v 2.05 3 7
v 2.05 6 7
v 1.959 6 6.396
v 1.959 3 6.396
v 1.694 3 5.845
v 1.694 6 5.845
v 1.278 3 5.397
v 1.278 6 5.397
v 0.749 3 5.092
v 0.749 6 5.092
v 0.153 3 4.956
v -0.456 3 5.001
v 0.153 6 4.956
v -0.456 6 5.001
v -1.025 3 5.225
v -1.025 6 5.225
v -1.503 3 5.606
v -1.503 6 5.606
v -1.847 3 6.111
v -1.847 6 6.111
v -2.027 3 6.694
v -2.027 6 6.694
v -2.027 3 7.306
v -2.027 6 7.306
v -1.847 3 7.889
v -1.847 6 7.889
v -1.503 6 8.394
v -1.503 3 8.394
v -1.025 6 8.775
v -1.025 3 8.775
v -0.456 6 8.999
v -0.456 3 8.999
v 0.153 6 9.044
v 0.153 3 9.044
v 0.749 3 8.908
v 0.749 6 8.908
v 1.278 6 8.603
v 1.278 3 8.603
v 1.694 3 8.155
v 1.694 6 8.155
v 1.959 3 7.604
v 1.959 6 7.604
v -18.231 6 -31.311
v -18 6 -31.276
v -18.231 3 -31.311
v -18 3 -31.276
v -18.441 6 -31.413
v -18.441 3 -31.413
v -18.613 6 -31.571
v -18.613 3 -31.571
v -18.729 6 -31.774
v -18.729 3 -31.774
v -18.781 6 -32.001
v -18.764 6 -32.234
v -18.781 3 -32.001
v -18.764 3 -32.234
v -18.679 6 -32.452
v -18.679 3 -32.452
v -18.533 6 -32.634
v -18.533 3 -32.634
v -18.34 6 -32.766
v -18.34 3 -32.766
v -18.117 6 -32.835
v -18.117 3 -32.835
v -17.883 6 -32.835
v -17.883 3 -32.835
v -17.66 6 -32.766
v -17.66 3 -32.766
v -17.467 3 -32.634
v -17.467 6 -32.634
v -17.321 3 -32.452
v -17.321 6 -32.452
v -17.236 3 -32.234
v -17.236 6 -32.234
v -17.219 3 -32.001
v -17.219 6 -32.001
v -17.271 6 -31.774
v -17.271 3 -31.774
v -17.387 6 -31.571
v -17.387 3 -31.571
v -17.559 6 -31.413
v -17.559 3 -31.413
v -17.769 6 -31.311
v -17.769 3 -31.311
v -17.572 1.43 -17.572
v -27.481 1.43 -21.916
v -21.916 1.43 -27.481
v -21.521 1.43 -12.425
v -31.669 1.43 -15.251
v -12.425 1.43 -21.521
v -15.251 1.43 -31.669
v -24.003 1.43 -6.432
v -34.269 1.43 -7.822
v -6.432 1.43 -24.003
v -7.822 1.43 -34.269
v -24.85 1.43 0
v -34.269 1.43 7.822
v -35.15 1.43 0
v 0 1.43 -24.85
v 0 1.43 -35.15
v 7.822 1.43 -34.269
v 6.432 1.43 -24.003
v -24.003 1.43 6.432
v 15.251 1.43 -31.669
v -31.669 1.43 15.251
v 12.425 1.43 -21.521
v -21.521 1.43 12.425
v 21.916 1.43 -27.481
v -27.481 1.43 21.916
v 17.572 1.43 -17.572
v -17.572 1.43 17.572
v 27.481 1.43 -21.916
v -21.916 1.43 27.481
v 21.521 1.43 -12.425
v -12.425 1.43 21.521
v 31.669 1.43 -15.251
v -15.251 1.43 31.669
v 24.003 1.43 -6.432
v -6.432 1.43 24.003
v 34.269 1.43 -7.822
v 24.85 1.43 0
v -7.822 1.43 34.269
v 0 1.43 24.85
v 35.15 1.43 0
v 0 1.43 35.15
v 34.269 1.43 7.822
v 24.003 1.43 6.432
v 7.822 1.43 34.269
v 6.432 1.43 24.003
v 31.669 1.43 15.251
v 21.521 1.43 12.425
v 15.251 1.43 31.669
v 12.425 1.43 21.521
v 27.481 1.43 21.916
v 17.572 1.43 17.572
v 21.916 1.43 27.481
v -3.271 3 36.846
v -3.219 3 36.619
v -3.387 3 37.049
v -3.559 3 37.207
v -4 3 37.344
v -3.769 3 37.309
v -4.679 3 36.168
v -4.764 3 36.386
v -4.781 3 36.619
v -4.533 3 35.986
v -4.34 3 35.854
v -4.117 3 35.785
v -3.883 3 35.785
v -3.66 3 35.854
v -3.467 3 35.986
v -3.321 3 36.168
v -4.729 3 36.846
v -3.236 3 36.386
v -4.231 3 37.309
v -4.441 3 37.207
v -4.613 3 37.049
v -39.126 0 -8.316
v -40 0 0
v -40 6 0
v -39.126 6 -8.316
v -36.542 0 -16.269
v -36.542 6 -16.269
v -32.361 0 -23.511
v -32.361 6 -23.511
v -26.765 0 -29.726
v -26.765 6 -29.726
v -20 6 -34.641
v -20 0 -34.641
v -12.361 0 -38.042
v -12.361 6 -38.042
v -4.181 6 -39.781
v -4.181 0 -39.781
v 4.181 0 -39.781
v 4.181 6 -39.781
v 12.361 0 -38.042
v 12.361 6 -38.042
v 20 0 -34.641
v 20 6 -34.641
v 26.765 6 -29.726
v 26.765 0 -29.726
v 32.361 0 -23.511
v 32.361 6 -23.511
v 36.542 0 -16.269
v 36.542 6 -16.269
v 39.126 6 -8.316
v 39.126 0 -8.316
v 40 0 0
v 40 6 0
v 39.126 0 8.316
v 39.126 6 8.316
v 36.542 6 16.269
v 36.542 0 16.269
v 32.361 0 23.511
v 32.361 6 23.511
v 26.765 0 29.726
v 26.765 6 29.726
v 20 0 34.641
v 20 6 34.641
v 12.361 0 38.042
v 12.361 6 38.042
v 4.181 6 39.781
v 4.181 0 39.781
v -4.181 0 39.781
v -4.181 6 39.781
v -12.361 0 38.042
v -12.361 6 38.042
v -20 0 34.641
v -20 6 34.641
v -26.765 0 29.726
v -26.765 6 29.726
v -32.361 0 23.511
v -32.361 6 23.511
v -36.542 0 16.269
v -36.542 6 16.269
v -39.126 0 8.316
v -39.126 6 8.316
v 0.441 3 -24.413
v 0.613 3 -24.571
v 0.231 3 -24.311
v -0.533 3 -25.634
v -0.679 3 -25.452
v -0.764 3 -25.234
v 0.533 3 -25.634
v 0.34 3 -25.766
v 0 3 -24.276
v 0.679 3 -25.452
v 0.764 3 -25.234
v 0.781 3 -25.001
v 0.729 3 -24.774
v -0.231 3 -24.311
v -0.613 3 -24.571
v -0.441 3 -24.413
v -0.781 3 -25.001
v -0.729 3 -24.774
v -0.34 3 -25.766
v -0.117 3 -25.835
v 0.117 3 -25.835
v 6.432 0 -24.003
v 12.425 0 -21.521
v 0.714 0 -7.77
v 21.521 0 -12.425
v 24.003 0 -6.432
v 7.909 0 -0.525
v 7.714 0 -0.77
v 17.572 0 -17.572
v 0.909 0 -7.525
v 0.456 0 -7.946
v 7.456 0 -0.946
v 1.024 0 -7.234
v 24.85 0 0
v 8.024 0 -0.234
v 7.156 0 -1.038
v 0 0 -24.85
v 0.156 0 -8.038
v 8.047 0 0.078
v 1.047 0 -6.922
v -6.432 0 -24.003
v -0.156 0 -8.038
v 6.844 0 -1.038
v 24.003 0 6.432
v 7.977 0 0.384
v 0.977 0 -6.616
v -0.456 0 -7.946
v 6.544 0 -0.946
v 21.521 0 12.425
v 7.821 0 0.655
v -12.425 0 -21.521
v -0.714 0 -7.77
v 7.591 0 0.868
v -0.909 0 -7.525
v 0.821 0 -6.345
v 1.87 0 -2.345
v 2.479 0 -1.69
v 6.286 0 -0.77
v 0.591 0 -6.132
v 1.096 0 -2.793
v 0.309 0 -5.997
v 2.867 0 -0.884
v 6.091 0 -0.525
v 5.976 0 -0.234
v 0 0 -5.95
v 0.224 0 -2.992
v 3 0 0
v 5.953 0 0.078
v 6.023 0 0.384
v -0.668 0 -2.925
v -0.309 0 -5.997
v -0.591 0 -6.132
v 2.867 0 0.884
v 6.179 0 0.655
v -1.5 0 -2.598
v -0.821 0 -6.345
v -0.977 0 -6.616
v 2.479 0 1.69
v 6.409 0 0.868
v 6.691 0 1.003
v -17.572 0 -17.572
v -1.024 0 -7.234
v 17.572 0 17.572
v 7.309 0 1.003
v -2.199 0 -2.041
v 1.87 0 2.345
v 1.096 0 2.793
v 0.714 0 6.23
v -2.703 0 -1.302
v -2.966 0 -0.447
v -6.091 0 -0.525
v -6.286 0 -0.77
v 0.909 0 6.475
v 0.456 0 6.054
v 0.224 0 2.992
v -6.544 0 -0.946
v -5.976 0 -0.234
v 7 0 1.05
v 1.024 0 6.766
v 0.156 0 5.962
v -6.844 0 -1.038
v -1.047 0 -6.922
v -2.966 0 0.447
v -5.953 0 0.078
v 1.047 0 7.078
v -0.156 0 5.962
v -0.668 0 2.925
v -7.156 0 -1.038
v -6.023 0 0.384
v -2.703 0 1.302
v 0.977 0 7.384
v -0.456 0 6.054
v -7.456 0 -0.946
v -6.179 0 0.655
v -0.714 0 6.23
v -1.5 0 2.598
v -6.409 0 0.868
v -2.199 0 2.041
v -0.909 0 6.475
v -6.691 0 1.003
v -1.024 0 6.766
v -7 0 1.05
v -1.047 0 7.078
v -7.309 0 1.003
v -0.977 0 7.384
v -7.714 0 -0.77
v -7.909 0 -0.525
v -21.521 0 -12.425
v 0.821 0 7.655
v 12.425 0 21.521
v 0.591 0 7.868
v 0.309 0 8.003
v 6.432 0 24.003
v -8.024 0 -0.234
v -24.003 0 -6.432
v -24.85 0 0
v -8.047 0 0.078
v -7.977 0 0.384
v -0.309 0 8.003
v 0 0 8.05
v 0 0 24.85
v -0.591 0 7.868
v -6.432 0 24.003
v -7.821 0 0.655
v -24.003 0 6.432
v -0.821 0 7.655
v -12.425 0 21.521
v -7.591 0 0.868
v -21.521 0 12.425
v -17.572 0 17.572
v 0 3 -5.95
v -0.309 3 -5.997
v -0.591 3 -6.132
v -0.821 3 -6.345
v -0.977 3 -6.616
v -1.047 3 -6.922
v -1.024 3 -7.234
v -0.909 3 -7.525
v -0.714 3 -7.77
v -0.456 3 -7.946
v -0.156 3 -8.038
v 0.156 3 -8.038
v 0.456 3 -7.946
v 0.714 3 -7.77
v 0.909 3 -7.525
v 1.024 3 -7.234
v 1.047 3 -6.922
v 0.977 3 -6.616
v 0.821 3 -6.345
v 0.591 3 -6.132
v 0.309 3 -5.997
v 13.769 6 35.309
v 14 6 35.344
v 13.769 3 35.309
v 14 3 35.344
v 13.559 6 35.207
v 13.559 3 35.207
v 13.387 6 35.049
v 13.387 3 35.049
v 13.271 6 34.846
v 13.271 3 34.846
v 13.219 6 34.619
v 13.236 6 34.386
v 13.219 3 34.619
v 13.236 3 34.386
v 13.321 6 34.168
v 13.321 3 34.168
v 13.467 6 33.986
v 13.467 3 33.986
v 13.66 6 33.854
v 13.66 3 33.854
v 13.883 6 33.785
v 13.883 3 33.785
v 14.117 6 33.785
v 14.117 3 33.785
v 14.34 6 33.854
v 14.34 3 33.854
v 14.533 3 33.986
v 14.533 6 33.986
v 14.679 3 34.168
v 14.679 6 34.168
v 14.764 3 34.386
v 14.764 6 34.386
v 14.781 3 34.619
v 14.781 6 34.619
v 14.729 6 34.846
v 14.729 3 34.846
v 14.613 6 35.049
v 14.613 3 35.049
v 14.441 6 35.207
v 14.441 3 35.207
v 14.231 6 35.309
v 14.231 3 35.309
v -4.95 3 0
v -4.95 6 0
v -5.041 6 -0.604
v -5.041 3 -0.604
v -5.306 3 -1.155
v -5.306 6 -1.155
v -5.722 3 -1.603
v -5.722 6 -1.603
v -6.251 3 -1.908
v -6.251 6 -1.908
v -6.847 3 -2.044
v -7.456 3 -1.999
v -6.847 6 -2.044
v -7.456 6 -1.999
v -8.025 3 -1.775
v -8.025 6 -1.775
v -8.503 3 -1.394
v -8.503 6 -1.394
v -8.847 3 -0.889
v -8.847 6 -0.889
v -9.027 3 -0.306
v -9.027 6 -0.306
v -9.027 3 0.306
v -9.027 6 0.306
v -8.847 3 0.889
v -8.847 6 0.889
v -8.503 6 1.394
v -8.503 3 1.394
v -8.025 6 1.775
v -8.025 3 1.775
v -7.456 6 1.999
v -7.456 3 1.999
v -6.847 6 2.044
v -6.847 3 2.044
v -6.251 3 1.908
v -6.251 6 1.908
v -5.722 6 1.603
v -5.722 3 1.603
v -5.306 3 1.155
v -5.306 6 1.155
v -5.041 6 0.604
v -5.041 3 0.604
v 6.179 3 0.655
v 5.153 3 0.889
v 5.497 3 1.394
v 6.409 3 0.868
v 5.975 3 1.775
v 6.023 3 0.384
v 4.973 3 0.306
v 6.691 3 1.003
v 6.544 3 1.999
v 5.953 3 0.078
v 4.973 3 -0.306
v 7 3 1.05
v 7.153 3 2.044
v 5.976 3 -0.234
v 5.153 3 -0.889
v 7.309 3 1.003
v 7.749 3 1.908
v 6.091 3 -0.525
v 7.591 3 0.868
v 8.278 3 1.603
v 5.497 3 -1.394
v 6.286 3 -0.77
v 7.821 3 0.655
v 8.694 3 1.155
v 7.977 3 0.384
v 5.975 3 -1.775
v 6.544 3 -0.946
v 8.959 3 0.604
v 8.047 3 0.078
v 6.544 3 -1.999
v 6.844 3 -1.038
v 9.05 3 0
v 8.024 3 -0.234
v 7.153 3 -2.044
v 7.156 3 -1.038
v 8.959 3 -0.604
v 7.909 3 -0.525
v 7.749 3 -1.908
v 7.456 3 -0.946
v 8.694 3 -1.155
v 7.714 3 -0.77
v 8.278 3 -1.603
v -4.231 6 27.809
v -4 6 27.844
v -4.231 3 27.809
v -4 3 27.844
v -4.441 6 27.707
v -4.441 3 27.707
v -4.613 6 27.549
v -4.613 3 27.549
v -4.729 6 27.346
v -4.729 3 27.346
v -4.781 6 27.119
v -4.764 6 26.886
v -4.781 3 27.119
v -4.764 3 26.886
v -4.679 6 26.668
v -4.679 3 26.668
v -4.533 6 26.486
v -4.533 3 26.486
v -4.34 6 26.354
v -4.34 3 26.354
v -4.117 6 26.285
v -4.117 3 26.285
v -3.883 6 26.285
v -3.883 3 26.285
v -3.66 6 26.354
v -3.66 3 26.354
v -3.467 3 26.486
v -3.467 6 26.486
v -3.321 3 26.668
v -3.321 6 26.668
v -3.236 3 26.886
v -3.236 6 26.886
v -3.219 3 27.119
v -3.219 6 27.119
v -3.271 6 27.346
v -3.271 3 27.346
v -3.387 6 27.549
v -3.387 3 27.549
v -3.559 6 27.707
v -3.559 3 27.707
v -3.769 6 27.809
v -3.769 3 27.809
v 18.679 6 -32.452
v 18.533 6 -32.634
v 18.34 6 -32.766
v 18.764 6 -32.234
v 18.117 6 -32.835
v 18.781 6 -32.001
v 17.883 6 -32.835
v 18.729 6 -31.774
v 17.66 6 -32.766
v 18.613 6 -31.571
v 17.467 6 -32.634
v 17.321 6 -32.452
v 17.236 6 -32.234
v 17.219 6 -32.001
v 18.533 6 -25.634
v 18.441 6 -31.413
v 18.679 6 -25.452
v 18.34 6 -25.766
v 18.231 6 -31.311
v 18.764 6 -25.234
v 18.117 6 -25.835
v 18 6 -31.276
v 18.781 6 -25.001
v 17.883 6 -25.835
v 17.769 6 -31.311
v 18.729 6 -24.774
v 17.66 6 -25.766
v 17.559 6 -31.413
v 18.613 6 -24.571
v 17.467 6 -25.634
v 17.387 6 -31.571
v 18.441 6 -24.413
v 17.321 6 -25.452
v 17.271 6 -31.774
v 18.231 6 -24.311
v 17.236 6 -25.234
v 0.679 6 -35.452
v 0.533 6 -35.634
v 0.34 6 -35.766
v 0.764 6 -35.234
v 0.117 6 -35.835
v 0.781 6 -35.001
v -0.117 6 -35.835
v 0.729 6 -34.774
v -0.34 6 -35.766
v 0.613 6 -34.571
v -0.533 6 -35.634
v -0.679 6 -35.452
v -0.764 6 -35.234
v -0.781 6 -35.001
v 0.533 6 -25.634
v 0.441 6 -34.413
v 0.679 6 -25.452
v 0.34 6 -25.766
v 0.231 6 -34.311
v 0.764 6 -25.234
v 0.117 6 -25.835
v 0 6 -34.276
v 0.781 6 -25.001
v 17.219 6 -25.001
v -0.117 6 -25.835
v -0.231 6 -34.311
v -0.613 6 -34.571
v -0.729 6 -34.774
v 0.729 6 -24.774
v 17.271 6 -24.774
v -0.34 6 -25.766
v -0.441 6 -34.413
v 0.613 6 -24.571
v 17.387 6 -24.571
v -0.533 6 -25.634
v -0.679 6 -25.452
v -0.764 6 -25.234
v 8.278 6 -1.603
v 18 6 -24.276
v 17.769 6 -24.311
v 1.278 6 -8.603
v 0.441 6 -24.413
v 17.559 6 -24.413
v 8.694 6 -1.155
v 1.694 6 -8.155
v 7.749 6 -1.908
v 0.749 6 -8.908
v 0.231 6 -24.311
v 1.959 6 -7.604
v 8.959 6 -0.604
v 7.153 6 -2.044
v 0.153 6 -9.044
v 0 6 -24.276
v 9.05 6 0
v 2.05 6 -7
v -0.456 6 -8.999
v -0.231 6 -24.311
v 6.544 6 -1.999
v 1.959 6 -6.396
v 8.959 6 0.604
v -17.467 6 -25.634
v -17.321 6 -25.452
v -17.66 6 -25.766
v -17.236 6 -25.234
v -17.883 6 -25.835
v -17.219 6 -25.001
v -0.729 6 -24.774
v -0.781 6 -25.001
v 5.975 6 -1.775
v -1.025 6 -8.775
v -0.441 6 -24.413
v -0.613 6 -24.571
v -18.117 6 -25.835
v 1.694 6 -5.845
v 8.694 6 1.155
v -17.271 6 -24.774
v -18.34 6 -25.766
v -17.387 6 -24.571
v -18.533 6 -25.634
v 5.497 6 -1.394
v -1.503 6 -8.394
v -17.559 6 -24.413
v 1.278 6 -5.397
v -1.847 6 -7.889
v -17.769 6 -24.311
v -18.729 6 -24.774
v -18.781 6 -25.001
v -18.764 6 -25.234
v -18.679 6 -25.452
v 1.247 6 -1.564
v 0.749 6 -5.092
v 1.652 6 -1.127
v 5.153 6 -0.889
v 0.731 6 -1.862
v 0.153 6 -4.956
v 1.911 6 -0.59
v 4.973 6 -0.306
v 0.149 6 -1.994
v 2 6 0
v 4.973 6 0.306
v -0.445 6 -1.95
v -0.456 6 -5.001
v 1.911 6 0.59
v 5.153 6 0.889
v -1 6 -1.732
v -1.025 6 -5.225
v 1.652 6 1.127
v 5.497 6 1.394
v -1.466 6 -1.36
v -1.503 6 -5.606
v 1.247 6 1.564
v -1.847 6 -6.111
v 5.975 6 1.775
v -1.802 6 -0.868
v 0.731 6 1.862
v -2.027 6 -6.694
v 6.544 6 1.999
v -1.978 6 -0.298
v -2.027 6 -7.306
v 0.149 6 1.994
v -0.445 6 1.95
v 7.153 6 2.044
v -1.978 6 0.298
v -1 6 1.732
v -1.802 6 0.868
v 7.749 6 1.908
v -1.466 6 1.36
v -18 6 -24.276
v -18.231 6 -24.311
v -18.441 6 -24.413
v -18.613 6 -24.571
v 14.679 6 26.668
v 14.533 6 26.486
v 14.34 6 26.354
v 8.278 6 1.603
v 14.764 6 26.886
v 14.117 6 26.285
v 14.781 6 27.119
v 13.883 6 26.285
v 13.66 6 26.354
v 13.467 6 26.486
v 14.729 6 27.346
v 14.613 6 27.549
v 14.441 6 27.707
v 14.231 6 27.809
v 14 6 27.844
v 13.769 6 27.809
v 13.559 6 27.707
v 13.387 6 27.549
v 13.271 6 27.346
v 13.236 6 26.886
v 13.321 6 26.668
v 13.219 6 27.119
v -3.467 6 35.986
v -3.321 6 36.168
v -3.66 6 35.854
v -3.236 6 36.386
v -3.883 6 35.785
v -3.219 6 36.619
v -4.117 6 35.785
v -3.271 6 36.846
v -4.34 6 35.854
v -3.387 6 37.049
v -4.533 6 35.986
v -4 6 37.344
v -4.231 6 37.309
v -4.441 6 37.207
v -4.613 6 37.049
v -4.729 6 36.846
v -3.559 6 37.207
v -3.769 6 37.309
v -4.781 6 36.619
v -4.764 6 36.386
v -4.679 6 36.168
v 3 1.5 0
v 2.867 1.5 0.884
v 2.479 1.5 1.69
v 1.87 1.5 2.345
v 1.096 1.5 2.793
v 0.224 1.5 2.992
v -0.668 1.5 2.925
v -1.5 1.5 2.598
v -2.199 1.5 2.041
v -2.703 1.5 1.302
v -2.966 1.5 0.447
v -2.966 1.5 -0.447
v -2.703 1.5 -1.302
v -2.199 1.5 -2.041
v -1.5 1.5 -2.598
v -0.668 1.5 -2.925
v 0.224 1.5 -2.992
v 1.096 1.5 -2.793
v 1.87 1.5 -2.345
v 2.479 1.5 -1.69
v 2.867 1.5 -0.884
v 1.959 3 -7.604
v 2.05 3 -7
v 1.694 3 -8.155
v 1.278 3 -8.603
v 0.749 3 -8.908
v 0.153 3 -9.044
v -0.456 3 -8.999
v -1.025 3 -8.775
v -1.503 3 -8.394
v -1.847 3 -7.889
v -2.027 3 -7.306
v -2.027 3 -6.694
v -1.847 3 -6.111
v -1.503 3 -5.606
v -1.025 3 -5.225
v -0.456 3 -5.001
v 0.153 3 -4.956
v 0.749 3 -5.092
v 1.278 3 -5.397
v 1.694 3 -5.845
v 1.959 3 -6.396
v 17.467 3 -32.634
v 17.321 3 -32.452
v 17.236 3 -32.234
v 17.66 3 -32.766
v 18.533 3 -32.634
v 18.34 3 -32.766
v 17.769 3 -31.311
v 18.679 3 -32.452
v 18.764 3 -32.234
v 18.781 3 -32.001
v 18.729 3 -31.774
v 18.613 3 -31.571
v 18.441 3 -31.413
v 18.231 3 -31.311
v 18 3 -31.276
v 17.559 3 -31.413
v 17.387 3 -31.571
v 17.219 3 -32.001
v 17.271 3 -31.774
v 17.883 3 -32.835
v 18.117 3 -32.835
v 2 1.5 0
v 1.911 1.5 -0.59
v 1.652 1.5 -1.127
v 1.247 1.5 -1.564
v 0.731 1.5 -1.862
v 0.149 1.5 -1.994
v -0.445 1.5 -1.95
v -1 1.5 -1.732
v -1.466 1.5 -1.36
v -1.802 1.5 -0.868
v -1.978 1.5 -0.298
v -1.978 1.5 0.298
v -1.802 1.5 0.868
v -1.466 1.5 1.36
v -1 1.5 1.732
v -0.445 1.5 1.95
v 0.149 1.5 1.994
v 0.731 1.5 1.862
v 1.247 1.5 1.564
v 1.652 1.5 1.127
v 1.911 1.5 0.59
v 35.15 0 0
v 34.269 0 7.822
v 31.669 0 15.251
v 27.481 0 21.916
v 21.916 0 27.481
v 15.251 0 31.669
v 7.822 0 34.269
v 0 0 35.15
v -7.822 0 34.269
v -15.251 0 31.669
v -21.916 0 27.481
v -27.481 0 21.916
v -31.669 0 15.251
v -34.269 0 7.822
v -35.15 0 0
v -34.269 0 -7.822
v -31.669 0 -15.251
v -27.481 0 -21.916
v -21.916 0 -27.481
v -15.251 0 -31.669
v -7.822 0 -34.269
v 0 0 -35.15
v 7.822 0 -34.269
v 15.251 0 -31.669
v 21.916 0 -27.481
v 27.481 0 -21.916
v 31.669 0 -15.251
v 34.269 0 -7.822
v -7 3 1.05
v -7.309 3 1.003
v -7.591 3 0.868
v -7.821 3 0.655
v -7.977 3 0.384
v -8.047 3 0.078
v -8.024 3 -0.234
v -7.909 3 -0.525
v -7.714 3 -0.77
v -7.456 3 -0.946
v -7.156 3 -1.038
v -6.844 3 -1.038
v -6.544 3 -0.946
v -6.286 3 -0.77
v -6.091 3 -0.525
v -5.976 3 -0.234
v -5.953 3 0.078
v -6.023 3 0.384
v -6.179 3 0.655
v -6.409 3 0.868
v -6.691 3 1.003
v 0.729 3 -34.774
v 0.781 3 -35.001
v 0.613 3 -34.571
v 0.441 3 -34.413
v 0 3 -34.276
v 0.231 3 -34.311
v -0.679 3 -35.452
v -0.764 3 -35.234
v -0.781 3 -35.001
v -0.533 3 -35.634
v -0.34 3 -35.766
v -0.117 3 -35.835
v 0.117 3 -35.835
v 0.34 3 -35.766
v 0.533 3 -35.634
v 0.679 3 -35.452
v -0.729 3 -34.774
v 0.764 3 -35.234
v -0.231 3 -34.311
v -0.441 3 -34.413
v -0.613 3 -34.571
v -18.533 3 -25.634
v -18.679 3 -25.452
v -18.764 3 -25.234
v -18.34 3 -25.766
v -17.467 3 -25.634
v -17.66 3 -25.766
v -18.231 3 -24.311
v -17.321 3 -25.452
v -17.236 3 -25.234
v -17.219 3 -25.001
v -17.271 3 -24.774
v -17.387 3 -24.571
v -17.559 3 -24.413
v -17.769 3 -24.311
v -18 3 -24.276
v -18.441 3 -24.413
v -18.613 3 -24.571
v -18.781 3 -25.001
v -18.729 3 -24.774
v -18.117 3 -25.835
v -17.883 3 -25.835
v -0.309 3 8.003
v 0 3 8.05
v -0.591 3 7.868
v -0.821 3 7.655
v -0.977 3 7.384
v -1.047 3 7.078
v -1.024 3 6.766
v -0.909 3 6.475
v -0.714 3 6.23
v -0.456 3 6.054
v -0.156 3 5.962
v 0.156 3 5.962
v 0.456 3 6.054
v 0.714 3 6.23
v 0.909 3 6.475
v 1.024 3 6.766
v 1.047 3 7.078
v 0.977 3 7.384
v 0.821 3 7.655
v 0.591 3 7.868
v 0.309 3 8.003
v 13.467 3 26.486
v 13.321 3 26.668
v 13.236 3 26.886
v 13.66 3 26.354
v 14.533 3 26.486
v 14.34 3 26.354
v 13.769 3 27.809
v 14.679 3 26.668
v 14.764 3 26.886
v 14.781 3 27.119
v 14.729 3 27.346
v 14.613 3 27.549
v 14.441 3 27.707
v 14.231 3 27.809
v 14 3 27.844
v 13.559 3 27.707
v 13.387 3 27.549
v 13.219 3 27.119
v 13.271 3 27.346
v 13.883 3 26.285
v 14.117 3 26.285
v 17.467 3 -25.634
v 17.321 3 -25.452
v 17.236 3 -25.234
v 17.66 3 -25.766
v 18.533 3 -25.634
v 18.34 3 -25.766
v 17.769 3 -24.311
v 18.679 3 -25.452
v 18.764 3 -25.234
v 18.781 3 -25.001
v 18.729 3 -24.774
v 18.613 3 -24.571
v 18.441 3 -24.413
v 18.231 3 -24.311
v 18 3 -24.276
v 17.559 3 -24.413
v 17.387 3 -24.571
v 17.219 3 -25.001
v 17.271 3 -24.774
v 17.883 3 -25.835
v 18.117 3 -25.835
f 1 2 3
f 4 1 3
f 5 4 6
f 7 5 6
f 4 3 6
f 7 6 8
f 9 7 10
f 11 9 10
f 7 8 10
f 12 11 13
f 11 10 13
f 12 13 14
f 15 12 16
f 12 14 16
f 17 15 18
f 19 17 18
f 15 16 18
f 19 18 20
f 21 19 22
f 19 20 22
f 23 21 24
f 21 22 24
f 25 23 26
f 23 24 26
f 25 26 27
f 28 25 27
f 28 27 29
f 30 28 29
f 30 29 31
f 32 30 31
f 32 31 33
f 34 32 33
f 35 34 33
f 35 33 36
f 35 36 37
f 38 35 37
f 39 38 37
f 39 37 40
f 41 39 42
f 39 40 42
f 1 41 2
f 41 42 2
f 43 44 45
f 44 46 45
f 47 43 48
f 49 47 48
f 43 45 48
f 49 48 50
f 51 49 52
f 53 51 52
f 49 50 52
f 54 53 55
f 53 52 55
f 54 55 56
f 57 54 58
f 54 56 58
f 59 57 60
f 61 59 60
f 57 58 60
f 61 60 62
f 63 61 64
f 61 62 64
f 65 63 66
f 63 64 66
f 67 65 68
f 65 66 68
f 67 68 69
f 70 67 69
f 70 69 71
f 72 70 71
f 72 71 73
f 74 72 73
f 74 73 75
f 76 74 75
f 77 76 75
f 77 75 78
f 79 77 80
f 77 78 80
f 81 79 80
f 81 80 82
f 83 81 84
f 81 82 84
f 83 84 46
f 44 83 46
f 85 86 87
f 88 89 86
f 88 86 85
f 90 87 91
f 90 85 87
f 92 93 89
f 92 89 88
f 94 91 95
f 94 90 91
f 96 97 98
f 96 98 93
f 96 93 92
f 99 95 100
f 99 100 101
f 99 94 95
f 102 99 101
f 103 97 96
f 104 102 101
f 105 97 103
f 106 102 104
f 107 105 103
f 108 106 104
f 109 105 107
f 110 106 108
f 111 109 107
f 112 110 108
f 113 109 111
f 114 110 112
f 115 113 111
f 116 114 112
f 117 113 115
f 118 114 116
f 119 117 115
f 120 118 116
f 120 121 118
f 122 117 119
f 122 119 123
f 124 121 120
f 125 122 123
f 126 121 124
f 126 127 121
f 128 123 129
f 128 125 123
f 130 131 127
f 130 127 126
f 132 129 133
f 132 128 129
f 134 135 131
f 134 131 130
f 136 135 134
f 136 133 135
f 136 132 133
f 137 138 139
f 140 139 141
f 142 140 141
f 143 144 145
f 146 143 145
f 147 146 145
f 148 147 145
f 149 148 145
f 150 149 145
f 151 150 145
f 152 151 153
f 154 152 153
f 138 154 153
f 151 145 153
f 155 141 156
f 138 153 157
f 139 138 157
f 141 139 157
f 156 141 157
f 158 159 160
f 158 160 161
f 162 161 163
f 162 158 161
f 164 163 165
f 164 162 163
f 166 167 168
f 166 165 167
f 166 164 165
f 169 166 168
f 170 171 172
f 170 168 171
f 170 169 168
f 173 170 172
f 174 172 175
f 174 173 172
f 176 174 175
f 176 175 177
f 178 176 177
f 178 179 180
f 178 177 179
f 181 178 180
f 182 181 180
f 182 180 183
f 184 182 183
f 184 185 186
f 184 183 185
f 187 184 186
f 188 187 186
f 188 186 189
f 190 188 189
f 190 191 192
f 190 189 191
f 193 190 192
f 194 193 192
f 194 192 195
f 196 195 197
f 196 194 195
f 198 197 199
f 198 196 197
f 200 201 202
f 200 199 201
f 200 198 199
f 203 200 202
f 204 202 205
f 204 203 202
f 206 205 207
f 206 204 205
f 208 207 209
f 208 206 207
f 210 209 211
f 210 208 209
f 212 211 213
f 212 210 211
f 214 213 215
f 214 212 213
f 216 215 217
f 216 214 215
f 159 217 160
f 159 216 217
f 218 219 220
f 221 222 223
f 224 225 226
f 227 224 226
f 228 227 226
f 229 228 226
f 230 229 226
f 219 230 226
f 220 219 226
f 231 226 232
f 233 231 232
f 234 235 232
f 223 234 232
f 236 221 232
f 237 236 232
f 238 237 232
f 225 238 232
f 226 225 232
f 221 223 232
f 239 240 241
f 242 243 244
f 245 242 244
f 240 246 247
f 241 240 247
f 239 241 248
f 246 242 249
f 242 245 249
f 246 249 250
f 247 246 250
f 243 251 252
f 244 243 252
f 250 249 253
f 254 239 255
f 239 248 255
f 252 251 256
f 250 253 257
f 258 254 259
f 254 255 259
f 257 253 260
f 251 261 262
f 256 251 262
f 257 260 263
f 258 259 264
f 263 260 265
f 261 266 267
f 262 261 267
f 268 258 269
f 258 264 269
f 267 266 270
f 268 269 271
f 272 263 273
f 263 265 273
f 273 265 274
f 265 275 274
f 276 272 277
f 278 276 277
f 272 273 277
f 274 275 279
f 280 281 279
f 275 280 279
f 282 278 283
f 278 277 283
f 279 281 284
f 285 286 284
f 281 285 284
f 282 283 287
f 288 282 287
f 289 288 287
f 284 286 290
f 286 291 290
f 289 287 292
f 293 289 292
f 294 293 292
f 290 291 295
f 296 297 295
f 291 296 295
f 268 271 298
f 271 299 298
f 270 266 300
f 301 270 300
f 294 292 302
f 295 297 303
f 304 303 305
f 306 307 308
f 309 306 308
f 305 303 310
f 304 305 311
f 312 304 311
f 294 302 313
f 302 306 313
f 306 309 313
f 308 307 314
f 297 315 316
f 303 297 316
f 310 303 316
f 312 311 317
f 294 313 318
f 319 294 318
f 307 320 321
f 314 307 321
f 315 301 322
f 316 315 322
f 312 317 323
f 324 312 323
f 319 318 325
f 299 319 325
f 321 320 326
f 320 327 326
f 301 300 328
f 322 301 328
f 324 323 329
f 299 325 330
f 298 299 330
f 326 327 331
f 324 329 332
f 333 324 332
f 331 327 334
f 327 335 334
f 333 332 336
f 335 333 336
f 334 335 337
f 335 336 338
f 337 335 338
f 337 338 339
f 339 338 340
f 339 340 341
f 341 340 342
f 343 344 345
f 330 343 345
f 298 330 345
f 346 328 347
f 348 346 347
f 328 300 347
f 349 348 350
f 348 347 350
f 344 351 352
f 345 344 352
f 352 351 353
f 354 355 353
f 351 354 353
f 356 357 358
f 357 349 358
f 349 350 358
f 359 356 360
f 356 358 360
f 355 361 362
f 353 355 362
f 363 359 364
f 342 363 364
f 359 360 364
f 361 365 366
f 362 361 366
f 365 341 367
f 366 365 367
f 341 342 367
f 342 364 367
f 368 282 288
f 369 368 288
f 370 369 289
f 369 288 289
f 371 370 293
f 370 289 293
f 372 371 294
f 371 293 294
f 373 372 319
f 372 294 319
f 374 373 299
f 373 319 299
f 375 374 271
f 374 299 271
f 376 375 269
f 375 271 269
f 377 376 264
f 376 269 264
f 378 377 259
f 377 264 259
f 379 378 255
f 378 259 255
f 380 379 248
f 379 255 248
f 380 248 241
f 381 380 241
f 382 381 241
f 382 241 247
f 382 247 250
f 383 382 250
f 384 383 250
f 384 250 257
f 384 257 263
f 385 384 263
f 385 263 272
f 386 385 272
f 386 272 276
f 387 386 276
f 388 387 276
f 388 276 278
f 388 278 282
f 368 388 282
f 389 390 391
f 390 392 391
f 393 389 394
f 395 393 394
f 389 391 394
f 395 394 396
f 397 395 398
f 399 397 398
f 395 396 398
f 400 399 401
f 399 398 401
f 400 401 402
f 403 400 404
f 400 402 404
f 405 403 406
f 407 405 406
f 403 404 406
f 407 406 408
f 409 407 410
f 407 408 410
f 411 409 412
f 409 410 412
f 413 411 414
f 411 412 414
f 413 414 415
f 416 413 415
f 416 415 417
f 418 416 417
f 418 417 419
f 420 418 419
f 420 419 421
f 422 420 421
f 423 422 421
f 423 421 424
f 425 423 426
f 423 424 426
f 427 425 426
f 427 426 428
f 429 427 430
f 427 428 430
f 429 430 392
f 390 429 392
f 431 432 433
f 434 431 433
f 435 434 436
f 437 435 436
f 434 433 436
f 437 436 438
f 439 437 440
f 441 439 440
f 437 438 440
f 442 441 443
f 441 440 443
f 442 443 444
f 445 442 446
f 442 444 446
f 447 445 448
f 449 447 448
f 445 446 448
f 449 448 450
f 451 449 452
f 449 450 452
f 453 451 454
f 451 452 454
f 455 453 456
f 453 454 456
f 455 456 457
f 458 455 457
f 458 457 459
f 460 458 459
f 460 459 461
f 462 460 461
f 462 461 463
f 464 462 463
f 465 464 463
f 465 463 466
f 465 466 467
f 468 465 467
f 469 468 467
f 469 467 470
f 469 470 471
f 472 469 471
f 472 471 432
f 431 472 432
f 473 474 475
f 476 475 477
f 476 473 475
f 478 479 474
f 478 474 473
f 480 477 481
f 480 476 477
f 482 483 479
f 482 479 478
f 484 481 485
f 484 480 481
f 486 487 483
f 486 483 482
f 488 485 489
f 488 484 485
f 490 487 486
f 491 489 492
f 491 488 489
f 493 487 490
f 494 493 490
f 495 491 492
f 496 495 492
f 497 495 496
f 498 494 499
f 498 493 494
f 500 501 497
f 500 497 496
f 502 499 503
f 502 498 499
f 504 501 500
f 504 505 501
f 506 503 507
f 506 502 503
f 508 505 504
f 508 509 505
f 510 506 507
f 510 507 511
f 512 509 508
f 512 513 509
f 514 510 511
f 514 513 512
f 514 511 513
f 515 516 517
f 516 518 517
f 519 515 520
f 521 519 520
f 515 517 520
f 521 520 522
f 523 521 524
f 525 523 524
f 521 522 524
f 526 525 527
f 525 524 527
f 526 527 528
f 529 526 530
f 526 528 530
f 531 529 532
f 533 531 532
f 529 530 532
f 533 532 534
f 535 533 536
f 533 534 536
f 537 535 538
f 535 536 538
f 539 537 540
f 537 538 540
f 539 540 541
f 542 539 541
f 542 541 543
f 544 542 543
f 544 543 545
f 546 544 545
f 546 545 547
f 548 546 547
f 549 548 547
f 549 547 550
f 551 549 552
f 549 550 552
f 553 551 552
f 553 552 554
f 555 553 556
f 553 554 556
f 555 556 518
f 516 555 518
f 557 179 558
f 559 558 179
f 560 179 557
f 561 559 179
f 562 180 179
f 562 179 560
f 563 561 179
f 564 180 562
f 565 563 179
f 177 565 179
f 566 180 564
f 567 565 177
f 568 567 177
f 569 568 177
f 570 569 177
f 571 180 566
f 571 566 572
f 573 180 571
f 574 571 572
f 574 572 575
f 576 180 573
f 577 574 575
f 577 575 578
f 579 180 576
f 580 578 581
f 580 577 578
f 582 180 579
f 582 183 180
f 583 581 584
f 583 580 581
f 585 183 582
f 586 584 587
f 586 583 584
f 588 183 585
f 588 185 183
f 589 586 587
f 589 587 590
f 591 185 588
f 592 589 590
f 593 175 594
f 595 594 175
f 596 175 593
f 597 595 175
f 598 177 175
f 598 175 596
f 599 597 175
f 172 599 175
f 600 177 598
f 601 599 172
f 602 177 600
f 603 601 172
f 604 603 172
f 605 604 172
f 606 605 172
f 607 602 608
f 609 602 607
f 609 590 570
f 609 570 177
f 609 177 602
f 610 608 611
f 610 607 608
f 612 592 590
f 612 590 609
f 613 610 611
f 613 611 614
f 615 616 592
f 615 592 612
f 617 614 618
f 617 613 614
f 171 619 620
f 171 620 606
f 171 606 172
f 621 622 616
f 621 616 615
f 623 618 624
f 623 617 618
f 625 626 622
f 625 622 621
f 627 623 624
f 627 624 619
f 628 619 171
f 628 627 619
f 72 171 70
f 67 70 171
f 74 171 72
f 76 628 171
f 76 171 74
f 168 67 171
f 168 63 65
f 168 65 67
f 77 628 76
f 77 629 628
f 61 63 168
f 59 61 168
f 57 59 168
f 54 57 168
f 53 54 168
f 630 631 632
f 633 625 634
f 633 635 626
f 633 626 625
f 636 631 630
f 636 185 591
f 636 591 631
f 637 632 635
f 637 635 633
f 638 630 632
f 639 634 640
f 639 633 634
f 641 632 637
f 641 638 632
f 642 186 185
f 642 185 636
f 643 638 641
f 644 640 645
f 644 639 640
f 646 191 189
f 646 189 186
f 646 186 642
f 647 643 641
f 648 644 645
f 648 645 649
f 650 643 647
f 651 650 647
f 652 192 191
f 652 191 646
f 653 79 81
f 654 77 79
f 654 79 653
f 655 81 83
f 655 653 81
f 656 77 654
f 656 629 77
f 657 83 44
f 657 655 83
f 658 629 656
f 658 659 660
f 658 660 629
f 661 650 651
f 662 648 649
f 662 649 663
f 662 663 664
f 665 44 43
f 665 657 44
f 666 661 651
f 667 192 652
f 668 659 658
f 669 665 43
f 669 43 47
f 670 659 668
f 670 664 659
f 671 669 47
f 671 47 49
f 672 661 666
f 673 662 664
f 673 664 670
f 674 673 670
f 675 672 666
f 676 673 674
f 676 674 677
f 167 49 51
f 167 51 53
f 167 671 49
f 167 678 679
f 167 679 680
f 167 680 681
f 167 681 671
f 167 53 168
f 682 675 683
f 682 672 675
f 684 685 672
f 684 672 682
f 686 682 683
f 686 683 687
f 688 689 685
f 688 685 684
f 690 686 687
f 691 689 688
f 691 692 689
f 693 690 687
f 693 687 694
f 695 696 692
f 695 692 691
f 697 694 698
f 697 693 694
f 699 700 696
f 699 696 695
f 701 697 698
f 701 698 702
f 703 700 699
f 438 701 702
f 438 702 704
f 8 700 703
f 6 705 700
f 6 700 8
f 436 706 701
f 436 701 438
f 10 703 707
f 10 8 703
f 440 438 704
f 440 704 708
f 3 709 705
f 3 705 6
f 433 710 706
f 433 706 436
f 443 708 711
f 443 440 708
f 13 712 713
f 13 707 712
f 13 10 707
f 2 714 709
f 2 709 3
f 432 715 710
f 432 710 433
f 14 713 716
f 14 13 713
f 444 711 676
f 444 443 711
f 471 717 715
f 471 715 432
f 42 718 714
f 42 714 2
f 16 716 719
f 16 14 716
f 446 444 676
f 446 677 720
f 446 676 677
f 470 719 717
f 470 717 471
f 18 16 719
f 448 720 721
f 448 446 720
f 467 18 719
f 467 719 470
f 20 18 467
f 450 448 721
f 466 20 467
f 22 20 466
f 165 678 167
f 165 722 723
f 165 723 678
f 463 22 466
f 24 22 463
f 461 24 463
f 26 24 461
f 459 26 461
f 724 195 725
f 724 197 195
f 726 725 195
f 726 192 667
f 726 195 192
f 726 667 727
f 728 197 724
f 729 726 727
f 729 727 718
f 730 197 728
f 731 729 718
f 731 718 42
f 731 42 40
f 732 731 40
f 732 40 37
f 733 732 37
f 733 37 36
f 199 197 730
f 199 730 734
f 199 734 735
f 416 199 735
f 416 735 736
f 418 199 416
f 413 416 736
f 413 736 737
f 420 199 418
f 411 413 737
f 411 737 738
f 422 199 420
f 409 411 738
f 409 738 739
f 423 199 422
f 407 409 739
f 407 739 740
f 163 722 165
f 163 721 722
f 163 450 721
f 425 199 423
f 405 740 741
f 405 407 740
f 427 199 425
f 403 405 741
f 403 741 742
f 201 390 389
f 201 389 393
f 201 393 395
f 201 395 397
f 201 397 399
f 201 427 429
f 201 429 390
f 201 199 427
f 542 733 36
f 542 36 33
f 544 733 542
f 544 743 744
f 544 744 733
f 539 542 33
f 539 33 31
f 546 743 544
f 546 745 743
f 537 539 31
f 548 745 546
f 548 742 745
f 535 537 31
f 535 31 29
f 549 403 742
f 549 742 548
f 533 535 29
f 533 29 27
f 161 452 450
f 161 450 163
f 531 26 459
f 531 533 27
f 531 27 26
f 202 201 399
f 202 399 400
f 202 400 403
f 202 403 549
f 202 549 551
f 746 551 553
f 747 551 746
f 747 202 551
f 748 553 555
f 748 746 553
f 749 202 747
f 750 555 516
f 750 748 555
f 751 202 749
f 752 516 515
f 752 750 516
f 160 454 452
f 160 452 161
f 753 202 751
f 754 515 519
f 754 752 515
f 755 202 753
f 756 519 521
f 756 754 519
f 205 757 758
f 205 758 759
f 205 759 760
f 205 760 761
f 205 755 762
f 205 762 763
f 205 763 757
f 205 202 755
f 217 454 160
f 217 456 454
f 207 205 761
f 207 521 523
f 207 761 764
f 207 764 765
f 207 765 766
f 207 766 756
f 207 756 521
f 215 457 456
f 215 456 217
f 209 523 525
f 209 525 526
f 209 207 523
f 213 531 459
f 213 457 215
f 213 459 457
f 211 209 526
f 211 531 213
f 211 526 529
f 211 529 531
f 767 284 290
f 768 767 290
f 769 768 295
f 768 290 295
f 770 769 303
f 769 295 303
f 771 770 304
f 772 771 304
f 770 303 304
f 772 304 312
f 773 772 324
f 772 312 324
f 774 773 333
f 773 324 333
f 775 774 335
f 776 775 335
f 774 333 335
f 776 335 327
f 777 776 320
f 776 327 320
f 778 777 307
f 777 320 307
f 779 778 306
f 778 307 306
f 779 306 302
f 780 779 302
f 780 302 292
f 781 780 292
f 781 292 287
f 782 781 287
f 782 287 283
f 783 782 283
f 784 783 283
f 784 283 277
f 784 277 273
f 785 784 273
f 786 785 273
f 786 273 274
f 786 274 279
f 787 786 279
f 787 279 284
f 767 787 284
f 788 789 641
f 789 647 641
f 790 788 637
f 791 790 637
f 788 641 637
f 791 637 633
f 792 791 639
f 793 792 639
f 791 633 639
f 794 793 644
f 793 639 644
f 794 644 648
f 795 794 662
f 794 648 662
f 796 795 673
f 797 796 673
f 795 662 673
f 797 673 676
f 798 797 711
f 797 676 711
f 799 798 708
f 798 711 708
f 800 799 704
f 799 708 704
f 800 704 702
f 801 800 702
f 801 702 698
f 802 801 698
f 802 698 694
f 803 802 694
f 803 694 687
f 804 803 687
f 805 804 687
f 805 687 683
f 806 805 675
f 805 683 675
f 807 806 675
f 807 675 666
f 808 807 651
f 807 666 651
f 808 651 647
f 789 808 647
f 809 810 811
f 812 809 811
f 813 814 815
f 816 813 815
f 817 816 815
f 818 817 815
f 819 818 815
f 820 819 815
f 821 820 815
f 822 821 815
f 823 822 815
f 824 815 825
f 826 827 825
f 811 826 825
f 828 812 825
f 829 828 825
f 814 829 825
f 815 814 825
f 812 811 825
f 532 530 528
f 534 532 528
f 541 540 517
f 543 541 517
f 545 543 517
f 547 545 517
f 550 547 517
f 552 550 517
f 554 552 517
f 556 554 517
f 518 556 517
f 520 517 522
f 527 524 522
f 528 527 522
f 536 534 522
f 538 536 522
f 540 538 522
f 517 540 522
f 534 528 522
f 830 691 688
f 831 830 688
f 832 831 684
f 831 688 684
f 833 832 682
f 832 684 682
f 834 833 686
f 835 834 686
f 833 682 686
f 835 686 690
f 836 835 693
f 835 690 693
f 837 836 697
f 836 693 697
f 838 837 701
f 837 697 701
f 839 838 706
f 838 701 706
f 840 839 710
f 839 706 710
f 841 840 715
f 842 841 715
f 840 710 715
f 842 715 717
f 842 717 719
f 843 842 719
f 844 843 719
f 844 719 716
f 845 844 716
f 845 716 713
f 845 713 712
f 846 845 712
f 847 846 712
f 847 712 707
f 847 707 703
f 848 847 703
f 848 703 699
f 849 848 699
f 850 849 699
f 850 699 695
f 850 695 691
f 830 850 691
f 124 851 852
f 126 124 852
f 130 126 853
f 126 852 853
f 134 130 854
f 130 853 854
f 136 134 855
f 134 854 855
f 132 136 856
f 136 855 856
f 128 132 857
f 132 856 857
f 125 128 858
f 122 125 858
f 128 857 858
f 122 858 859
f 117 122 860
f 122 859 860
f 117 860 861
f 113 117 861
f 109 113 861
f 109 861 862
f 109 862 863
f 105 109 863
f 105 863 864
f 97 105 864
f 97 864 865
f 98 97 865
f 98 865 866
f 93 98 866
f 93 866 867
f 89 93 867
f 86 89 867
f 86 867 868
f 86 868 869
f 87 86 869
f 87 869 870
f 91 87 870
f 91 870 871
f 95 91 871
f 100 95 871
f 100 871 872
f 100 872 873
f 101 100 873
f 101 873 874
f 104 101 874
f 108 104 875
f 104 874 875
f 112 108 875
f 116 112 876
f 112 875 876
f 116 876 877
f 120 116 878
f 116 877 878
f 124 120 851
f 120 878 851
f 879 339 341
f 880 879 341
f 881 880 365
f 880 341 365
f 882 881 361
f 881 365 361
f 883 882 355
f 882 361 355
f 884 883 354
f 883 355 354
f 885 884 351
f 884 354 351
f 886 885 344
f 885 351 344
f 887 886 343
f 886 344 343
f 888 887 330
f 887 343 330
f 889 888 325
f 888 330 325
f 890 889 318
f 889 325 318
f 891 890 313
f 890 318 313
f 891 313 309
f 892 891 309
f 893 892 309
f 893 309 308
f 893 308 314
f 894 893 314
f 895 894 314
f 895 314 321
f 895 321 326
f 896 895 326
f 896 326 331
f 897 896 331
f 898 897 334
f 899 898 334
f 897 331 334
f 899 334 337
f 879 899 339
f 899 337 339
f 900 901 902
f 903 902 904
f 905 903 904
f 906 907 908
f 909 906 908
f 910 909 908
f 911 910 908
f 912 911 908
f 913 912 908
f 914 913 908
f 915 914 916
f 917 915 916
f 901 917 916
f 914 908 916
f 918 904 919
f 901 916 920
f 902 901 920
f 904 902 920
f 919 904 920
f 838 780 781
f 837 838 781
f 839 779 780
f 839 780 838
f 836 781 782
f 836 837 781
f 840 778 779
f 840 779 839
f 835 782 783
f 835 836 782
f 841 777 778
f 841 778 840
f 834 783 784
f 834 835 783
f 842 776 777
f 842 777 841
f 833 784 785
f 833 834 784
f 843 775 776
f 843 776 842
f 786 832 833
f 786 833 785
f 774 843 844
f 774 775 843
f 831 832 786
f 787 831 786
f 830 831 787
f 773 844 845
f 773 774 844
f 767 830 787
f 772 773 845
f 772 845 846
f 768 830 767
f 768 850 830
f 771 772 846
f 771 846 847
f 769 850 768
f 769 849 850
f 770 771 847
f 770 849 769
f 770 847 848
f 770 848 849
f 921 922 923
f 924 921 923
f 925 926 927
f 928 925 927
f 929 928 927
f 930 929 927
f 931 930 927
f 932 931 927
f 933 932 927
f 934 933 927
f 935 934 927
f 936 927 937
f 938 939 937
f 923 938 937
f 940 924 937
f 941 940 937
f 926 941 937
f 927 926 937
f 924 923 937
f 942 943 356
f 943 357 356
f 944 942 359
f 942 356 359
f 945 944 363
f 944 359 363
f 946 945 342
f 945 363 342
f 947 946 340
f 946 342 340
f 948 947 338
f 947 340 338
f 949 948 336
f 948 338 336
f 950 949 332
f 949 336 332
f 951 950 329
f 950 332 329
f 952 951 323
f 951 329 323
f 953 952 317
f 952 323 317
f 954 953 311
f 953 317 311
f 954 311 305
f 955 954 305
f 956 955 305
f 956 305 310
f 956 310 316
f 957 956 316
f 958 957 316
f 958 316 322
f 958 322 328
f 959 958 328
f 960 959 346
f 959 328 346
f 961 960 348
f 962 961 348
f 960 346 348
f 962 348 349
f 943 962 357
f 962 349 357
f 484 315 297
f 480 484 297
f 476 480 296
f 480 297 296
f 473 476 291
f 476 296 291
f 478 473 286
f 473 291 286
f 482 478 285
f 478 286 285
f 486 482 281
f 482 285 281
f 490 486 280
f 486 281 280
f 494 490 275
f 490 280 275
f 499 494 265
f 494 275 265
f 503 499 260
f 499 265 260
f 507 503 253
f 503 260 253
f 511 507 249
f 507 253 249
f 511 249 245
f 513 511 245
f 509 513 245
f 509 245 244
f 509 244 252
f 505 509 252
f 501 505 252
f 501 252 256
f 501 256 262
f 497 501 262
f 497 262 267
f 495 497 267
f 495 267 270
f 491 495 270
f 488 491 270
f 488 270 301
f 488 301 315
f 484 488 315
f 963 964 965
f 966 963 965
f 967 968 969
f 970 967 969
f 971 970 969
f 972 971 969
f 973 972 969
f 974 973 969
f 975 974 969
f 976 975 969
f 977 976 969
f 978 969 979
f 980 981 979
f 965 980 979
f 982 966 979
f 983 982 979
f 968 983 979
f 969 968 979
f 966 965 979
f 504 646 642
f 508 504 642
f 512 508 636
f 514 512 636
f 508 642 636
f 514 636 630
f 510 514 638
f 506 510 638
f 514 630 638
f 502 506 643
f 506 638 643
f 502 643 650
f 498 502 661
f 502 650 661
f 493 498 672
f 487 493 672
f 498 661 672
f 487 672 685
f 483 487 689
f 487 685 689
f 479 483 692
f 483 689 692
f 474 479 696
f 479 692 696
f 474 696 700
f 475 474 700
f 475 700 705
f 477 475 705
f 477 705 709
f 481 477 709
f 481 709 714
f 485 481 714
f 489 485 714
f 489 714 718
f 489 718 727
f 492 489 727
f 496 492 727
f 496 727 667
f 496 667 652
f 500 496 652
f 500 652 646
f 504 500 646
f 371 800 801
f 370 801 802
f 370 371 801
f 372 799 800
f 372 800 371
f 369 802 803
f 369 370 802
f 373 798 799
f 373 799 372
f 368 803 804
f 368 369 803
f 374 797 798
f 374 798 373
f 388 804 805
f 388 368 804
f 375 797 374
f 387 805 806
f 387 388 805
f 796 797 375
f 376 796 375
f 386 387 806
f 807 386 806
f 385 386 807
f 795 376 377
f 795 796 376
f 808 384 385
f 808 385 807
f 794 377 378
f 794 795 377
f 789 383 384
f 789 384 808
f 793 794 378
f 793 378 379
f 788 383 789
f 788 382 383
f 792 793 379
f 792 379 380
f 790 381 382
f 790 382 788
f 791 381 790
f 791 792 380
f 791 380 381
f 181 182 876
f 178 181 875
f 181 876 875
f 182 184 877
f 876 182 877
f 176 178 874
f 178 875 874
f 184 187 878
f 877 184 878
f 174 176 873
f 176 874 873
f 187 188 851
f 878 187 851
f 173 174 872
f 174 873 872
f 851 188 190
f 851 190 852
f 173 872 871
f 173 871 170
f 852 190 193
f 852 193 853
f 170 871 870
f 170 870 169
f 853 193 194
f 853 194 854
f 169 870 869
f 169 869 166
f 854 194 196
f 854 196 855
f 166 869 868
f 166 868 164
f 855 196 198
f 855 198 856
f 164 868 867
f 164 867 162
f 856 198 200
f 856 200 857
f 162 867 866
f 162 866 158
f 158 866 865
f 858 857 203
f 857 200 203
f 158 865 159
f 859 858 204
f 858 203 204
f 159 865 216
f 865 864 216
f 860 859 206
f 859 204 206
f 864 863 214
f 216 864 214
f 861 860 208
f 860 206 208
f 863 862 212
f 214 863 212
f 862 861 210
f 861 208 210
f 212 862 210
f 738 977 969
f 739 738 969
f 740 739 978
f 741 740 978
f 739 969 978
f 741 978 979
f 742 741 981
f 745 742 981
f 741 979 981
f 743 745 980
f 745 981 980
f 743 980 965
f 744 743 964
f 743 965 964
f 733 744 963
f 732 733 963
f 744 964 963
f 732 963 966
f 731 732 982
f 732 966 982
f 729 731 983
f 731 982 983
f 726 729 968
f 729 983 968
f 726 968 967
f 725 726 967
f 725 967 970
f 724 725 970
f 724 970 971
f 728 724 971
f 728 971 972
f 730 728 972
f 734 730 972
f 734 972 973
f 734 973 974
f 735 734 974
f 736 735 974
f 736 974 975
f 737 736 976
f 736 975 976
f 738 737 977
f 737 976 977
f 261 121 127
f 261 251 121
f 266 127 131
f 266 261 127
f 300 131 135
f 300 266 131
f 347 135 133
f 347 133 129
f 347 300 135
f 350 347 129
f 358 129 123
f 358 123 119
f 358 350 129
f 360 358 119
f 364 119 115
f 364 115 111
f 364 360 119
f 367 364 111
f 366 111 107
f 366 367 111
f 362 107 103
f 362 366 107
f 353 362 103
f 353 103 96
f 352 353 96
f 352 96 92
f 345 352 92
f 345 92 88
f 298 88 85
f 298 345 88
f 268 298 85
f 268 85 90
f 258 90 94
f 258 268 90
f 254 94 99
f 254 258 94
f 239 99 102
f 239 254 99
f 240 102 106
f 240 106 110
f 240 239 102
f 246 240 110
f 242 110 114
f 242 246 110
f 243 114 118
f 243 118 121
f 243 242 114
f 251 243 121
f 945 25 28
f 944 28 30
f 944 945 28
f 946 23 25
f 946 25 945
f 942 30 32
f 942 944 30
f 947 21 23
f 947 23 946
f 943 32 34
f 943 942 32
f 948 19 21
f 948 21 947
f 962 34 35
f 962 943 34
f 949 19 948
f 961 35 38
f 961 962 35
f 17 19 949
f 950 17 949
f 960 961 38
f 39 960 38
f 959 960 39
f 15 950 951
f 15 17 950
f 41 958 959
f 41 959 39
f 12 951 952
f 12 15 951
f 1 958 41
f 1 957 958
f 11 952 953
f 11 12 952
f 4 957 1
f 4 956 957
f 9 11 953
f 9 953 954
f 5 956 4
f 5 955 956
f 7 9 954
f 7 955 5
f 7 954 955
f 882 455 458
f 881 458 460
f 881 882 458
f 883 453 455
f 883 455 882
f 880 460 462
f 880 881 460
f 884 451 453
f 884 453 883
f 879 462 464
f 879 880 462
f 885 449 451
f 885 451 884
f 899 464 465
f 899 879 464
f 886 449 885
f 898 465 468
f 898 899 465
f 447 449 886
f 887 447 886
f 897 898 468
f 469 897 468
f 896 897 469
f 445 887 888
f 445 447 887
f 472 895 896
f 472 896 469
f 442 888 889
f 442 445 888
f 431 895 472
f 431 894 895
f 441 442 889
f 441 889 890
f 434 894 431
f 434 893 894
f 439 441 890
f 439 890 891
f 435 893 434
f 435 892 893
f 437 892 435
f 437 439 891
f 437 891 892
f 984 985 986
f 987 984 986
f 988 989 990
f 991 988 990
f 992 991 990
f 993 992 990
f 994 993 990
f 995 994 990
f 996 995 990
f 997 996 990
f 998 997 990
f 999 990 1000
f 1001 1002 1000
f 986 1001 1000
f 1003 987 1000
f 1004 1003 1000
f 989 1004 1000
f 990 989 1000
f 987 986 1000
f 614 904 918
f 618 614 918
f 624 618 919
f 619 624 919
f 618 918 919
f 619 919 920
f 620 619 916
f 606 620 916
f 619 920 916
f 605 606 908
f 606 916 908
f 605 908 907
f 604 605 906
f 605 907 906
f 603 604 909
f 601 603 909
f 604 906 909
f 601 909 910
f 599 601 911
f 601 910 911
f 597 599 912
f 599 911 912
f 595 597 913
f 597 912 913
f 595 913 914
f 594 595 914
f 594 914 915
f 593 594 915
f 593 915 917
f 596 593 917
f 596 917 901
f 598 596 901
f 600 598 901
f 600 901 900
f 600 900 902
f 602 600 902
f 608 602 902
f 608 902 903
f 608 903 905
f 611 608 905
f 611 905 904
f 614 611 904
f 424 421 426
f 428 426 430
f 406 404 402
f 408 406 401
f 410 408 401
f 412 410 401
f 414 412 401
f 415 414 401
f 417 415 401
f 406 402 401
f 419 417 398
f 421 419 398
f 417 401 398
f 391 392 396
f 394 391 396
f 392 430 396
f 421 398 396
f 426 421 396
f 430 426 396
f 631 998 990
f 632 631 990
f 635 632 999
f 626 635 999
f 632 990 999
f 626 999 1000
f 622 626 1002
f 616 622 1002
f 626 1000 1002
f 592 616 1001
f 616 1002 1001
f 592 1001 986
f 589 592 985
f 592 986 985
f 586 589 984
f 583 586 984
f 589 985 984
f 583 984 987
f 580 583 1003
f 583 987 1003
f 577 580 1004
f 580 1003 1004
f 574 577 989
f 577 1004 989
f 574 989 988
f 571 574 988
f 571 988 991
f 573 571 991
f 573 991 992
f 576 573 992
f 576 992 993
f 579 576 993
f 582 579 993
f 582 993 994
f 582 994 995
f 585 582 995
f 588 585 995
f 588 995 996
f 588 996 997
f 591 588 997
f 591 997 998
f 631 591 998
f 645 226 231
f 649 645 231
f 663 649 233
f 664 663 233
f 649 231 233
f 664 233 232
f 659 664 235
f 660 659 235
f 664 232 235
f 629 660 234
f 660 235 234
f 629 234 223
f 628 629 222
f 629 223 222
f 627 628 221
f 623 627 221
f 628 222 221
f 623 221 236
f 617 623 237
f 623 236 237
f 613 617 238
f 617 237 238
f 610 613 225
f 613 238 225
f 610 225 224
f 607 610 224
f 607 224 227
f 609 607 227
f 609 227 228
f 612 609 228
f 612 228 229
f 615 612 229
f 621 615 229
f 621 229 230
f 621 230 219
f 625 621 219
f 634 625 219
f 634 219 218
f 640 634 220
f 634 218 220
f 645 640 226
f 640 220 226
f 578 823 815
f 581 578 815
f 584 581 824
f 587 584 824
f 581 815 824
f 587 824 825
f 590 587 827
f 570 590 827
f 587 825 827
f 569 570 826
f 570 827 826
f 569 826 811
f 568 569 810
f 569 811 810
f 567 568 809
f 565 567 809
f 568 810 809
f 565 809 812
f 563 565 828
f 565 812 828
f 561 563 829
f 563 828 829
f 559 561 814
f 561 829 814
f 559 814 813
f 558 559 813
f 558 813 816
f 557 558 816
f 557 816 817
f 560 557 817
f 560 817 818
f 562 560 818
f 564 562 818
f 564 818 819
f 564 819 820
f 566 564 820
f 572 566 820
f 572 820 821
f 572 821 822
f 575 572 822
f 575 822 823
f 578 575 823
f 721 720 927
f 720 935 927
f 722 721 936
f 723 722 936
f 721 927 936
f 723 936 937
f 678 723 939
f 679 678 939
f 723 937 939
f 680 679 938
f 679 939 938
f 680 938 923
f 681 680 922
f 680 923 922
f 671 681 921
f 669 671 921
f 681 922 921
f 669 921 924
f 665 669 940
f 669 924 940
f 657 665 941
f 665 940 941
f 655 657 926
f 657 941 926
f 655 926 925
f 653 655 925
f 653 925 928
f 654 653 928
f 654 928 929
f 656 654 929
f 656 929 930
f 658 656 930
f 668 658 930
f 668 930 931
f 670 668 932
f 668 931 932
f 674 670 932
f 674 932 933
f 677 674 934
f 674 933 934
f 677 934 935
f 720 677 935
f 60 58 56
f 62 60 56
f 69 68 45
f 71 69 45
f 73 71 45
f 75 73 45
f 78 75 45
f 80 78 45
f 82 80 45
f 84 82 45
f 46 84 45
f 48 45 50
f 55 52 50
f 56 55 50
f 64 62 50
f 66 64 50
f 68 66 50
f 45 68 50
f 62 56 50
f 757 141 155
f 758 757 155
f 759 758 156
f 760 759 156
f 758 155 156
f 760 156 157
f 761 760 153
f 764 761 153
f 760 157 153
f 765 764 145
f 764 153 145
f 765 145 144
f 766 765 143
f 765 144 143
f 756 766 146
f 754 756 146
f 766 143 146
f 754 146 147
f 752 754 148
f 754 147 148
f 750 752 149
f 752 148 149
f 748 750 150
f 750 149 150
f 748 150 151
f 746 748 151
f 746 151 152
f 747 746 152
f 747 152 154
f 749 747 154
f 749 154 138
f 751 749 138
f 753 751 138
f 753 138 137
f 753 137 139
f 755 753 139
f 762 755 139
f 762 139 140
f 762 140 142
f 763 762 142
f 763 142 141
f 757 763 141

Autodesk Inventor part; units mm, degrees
ref_plane "YZ Plane" through (0, 0, 0) normal (1, 0, 0) x (0, 1, 0)
ref_plane "XZ Plane" through (0, 0, 0) normal (0, 1, 0) x (-1, 0, 0)
ref_plane "XY Plane" through (0, 0, 0) normal (0, 0, 1) x (1, 0, 0)
sketch "Sketch1" plane through (0, 0, 0) normal (0, 1, 0) x (-1, 0, 0)
  circle A0 centre (0, 0) radius 40
  dimension "d0" = 80
extrude "Extrusion1" add sketch "Sketch1" along normal blind 6
sketch "Sketch2" plane through (0, 0, 0) normal (0, -1, 0) x (1, 0, 0)
  circle A0 centre (0, 0) radius 35.15 projected
  circle A1 centre (0, 0) radius 24.85 projected
  point P0 (0, 0)
extrude "Extrusion2" cut sketch "Sketch2" against normal blind 1.43
sketch "Sketch3" plane through (0, 6, 0) normal (0, 1, 0) x (1, 0, 0)
  circle A0 centre (-7, 0) radius 0.7835 projected
  circle A1 centre (0, 7) radius 0.7835 projected
  circle A2 centre (0, -7) radius 0.7835 projected
  circle A3 centre (7, 0) radius 0.7835 projected
  point P0 (0, 0)
hole "Hole1" at (-7, 6, 0) at (0, 6, 7) at (7, 6, 0) at (0, 6, -7) direction (0, -1, 0) diameter 2.1 end through all
sketch "Sketch4" plane through (0, 6, 0) normal (0, 1, 0) x (1, 0, 0)
  circle A0 centre (0, 7) radius 1.05 projected
  circle A1 centre (7, 0) radius 1.05 projected
  circle A2 centre (0, -7) radius 1.05 projected
  circle A3 centre (-7, 0) radius 1.05 projected
  circle A4 centre (0, 0) radius 40 projected
  circle A5 centre (-7, 0) radius 2.05
  circle A6 centre (0, -7) radius 2.05
  circle A7 centre (7, 0) radius 2.05
  circle A8 centre (0, 7) radius 2.05
  dimension "d12" = 4.1
extrude "Extrusion3" cut sketch "Sketch4" against normal blind 3 contours A5 | A6 | A7 | A8
sketch "Sketch5" plane through (0, 6, 0) normal (0, 1, 0) x (1, 0, 0)
  circle A0 centre (0, 0) radius 1.75 projected
  circle A1 centre (0, 0) radius 2
  dimension "d27" = 4
extrude "Extrusion4" cut sketch "Sketch5" against normal through all contours A0 | A1
sketch "Sketch6" plane through (0, 0, 0) normal (0, -1, 0) x (1, 0, 0)
  circle A0 centre (0, 0) radius 3
  dimension "d17" = 6
extrude "Extrusion5" cut sketch "Sketch6" against normal blind 1.5
sketch "Sketch7" plane through (0, 6, 0) normal (0, 1, 0) x (1, 0, 0)
  circle A0 centre (-4, -36.56) radius 1.05 projected
  circle A1 centre (-4, -27.06) radius 1.05 projected
  circle A2 centre (14, -27.06) radius 1.05 projected
  circle A3 centre (14, -34.56) radius 1.05 projected
  circle A4 centre (18, 25.06) radius 1.05 projected
  circle A5 centre (18, 32.06) radius 1.05 projected
  circle A6 centre (0, 35.06) radius 1.05 projected
  circle A7 centre (0, 25.06) radius 1.05 projected
  circle A8 centre (-18, 32.06) radius 1.05 projected
  circle A9 centre (-18, 25.06) radius 1.05 projected
  point P0 (0, 0)
hole "Hole2" at (-18, 6, -32.06) at (0, 6, -35.06) at (18, 6, -32.06) at (18, 6, -25.06) at (0, 6, -25.06) at (-18, 6, -25.06) at (-4, 6, 27.06) at (14, 6, 27.06) at (14, 6, 34.56) at (-4, 6, 36.56) direction (0, -1, 0) diameter 1.567 depth 3 thread size "M2x0.4" class "6H" standard "ISO Metric profile"
properties part number "axis_2_bottom_frame" material "Aluminum 6061-AHC"
